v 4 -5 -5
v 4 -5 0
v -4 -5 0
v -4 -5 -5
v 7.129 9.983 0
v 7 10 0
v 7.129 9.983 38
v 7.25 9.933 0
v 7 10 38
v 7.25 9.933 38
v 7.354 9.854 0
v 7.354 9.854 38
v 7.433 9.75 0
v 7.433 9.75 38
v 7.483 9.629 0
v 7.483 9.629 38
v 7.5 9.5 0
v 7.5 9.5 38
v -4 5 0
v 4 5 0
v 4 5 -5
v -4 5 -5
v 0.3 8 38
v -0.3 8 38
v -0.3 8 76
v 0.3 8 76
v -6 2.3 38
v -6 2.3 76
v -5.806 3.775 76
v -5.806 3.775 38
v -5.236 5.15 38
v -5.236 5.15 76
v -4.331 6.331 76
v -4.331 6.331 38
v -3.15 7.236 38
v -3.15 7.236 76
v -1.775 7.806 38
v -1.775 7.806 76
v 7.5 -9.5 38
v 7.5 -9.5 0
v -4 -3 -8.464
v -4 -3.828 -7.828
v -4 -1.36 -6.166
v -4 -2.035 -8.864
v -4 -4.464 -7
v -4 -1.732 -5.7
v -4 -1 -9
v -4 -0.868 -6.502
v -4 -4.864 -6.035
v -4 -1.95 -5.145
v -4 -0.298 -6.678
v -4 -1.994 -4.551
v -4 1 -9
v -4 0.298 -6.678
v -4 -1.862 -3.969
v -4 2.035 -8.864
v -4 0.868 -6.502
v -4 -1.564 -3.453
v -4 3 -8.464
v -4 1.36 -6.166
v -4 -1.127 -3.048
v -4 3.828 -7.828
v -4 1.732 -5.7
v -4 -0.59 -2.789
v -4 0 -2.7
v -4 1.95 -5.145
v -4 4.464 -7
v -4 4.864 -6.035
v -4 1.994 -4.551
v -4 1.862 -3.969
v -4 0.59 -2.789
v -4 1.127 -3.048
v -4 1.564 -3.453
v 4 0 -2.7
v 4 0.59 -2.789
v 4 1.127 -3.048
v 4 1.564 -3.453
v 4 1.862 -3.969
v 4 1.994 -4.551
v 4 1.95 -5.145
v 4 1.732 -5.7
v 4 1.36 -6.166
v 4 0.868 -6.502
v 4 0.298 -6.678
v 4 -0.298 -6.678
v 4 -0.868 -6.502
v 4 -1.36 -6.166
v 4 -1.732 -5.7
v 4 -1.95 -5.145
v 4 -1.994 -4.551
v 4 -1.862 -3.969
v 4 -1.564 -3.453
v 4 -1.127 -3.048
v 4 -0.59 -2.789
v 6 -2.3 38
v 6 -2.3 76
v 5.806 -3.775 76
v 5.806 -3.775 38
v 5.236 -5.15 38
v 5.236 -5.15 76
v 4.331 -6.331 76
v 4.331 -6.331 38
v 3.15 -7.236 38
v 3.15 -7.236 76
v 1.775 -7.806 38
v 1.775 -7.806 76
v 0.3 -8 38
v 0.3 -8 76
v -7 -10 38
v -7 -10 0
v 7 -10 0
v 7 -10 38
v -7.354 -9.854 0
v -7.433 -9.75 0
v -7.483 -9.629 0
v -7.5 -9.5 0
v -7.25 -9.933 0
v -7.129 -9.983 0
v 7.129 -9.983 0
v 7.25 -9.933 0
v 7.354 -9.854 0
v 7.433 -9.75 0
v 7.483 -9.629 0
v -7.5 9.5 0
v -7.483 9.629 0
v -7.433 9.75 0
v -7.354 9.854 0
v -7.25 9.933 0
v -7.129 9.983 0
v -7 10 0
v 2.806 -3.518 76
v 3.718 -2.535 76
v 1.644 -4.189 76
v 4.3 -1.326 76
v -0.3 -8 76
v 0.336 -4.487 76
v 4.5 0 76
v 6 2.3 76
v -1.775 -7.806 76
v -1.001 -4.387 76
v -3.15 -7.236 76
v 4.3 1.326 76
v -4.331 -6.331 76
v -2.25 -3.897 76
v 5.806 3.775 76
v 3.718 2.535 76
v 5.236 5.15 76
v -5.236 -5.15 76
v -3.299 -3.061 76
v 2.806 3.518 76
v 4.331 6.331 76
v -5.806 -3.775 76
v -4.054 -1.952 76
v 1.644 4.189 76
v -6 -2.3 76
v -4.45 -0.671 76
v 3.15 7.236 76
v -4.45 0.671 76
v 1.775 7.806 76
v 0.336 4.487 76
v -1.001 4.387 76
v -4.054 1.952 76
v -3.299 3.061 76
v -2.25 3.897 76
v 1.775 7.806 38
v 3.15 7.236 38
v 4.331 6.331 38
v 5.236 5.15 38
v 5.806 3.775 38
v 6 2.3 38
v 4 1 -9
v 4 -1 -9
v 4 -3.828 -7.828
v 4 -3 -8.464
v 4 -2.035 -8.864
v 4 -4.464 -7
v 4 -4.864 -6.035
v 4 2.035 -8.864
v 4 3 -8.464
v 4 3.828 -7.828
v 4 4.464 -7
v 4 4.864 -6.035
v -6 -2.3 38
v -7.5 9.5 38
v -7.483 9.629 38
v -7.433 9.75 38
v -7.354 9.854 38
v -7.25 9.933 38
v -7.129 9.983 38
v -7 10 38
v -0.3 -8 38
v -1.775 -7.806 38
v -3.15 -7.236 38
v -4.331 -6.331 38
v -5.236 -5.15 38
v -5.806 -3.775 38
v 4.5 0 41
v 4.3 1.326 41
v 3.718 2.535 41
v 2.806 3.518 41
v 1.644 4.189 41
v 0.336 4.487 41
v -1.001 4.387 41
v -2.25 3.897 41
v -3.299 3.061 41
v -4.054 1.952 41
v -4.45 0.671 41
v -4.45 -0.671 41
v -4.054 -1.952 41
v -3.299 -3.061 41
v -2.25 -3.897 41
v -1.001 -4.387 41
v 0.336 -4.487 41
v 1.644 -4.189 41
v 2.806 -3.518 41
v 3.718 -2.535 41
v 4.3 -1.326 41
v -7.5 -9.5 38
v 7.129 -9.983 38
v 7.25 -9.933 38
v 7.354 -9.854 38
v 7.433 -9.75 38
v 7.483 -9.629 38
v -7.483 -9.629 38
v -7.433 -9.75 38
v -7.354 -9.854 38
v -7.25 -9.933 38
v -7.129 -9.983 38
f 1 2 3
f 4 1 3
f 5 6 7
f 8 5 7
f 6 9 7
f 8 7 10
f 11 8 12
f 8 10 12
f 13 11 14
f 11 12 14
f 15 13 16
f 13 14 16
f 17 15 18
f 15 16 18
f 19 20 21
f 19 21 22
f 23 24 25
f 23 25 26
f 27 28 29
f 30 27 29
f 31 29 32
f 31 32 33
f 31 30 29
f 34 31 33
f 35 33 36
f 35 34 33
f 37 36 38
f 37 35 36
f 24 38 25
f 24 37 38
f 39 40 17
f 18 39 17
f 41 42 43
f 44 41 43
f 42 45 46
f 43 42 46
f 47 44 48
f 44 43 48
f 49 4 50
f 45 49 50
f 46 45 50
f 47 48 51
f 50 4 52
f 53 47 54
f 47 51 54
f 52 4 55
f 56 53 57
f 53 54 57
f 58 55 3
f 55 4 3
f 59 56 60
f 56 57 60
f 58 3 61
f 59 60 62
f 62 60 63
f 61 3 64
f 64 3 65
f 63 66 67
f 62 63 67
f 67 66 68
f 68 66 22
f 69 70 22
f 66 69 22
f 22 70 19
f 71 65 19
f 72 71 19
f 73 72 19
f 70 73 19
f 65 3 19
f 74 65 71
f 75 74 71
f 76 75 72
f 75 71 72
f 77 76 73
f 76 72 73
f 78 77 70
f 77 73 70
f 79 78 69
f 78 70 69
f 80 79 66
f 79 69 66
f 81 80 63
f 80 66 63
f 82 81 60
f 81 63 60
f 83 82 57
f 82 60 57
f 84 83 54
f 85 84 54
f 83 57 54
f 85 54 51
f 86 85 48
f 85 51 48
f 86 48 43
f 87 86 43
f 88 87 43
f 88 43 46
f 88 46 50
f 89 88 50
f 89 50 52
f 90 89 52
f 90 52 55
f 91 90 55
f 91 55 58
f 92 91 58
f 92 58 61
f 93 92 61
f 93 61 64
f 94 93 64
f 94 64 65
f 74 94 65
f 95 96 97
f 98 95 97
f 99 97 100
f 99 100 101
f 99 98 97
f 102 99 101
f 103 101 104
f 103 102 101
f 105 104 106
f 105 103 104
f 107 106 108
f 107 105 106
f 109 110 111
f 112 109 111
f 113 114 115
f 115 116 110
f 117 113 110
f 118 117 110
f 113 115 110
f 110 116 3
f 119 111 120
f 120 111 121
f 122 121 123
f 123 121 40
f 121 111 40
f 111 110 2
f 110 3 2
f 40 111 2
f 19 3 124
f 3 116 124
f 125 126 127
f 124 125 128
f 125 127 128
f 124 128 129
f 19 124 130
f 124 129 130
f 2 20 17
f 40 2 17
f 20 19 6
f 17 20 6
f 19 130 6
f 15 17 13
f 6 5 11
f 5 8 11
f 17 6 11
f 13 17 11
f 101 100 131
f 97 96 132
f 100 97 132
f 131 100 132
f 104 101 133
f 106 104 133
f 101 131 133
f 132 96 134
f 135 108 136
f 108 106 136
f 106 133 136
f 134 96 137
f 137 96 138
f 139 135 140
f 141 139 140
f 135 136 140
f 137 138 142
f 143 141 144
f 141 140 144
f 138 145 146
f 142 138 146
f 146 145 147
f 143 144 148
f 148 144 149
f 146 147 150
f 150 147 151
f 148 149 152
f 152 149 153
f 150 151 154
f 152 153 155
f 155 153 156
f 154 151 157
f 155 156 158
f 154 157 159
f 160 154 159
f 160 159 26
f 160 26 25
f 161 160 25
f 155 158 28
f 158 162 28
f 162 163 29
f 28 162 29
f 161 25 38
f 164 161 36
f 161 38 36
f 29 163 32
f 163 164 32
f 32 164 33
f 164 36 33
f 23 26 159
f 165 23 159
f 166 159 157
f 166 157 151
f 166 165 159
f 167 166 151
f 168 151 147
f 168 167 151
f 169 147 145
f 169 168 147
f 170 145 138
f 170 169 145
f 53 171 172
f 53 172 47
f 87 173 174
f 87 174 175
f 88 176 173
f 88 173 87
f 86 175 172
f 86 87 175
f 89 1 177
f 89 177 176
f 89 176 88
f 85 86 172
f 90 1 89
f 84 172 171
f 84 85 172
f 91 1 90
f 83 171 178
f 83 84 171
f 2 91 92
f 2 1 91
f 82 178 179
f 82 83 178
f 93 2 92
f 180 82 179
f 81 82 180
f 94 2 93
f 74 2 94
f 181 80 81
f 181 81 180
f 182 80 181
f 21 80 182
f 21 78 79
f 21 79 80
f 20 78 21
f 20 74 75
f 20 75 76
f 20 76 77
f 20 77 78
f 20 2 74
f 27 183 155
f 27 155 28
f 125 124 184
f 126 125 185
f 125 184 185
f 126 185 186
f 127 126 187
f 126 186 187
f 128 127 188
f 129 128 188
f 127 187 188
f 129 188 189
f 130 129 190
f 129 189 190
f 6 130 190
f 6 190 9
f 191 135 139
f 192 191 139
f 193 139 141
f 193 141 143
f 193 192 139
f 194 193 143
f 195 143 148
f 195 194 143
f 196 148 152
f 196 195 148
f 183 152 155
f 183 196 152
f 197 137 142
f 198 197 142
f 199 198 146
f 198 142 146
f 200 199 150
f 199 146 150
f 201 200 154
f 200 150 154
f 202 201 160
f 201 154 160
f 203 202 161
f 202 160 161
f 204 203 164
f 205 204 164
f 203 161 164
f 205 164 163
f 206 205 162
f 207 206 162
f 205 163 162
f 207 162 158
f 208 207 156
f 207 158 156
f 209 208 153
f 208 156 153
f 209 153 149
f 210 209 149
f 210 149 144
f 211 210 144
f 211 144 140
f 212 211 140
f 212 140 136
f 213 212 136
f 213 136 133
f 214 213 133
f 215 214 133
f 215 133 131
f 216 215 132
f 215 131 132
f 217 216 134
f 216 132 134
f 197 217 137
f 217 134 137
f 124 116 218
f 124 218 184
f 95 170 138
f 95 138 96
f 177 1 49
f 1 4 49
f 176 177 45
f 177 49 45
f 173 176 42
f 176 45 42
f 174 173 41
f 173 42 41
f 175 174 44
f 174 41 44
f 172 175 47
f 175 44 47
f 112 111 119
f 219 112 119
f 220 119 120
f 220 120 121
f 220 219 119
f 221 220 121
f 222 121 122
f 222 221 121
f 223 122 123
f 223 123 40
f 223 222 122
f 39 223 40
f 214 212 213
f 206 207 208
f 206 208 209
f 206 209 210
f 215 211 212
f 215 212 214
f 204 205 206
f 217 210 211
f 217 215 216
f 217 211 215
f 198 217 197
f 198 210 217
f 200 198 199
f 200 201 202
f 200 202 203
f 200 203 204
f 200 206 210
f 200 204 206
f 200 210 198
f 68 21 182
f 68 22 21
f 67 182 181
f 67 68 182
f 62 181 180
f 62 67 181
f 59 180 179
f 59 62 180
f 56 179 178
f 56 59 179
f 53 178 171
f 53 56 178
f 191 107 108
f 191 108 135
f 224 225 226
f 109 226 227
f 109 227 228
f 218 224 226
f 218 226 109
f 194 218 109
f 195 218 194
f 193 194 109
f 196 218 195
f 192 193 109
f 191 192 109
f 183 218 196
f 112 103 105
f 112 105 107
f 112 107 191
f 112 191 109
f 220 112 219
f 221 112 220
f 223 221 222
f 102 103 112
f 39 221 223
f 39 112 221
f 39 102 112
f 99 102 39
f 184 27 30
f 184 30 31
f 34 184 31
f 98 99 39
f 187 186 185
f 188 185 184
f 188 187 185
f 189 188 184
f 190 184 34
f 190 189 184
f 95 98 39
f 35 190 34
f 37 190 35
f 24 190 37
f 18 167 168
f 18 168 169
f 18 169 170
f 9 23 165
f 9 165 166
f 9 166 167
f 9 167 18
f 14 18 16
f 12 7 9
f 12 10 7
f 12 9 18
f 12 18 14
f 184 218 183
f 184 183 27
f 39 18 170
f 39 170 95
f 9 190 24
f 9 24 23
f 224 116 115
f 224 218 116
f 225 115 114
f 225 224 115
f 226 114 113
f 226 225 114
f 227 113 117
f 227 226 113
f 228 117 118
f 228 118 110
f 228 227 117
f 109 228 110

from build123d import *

# Parameters (mm, degrees)
SKETCH_1_W          = 15
SKETCH_1_H          = 20
EXTRUDE_1_DEPTH     = 38
EXTRUDE_2_DEPTH     = 38
SKETCH_3_W          = 8
SKETCH_3_H          = 10
EXTRUDE_3_DEPTH     = 9
FILLET_1_R          = 4
SKETCH_4_R          = 2
CUT_EXTRUDE_1_DEPTH = 78.512902152
FILLET_2_R          = 0.5
SKETCH_5_R          = 4.5
CUT_EXTRUDE_2_DEPTH = 35


with BuildPart() as part:
    # Эскиз1 → Бобышка-Вытянуть1 (new body)
    with BuildSketch(Plane.XY):
        Rectangle(SKETCH_1_W, SKETCH_1_H)
    extrude(amount=EXTRUDE_1_DEPTH)

    # Эскиз2 → Бобышка-Вытянуть2 (add)
    with BuildSketch(Plane.XY.offset(38)):
        with BuildLine():
            Line((0.3, -8), (-0.3, -8))
            ThreePointArc((-0.3, -8), (-4.330508653, -6.330508653), (-6, -2.3))
            Line((-6, -2.3), (-6, 2.3))
            ThreePointArc((-6, 2.3), (-4.330508653, 6.330508653), (-0.3, 8))
            Line((-0.3, 8), (0.3, 8))
            ThreePointArc((0.3, 8), (4.330508653, 6.330508653), (6, 2.3))
            Line((6, 2.3), (6, -2.3))
            ThreePointArc((6, -2.3), (4.330508653, -6.330508653), (0.3, -8))
        make_face()
    extrude(amount=EXTRUDE_2_DEPTH)

    # Эскиз3 → Бобышка-Вытянуть3 (add)
    with BuildSketch(Plane(origin=(0, 0, 0), x_dir=(-1, 0, 0), z_dir=(0, 0, -1))):
        Rectangle(SKETCH_3_W, SKETCH_3_H)
    extrude(amount=EXTRUDE_3_DEPTH)

    # Скругление1
    fillet_1_edges = [part.edges().sort_by_distance(p)[0] for p in [
        (0, 5, -9),
        (0, -5, -9),
    ]]
    fillet(fillet_1_edges, radius=FILLET_1_R)

    # Эскиз4 → Вырез-Вытянуть1 (cut, through all)
    with BuildSketch(Plane.ZY.offset(4)):
        with Locations((-4.7, 0)):
            Circle(SKETCH_4_R)
    extrude(amount=-CUT_EXTRUDE_1_DEPTH, mode=Mode.SUBTRACT)

    # Скругление2
    fillet_2_edges = [part.edges().sort_by_distance(p)[0] for p in [
        (-7.5, 10, 19),
        (7.5, 10, 19),
        (7.5, -10, 19),
        (-7.5, -10, 19),
    ]]
    fillet(fillet_2_edges, radius=FILLET_2_R)

    # Эскиз5 → Вырез-Вытянуть2 (cut)
    with BuildSketch(Plane.XY.offset(76)):
        Circle(SKETCH_5_R)
    extrude(amount=-CUT_EXTRUDE_2_DEPTH, mode=Mode.SUBTRACT)


solid = part.part
